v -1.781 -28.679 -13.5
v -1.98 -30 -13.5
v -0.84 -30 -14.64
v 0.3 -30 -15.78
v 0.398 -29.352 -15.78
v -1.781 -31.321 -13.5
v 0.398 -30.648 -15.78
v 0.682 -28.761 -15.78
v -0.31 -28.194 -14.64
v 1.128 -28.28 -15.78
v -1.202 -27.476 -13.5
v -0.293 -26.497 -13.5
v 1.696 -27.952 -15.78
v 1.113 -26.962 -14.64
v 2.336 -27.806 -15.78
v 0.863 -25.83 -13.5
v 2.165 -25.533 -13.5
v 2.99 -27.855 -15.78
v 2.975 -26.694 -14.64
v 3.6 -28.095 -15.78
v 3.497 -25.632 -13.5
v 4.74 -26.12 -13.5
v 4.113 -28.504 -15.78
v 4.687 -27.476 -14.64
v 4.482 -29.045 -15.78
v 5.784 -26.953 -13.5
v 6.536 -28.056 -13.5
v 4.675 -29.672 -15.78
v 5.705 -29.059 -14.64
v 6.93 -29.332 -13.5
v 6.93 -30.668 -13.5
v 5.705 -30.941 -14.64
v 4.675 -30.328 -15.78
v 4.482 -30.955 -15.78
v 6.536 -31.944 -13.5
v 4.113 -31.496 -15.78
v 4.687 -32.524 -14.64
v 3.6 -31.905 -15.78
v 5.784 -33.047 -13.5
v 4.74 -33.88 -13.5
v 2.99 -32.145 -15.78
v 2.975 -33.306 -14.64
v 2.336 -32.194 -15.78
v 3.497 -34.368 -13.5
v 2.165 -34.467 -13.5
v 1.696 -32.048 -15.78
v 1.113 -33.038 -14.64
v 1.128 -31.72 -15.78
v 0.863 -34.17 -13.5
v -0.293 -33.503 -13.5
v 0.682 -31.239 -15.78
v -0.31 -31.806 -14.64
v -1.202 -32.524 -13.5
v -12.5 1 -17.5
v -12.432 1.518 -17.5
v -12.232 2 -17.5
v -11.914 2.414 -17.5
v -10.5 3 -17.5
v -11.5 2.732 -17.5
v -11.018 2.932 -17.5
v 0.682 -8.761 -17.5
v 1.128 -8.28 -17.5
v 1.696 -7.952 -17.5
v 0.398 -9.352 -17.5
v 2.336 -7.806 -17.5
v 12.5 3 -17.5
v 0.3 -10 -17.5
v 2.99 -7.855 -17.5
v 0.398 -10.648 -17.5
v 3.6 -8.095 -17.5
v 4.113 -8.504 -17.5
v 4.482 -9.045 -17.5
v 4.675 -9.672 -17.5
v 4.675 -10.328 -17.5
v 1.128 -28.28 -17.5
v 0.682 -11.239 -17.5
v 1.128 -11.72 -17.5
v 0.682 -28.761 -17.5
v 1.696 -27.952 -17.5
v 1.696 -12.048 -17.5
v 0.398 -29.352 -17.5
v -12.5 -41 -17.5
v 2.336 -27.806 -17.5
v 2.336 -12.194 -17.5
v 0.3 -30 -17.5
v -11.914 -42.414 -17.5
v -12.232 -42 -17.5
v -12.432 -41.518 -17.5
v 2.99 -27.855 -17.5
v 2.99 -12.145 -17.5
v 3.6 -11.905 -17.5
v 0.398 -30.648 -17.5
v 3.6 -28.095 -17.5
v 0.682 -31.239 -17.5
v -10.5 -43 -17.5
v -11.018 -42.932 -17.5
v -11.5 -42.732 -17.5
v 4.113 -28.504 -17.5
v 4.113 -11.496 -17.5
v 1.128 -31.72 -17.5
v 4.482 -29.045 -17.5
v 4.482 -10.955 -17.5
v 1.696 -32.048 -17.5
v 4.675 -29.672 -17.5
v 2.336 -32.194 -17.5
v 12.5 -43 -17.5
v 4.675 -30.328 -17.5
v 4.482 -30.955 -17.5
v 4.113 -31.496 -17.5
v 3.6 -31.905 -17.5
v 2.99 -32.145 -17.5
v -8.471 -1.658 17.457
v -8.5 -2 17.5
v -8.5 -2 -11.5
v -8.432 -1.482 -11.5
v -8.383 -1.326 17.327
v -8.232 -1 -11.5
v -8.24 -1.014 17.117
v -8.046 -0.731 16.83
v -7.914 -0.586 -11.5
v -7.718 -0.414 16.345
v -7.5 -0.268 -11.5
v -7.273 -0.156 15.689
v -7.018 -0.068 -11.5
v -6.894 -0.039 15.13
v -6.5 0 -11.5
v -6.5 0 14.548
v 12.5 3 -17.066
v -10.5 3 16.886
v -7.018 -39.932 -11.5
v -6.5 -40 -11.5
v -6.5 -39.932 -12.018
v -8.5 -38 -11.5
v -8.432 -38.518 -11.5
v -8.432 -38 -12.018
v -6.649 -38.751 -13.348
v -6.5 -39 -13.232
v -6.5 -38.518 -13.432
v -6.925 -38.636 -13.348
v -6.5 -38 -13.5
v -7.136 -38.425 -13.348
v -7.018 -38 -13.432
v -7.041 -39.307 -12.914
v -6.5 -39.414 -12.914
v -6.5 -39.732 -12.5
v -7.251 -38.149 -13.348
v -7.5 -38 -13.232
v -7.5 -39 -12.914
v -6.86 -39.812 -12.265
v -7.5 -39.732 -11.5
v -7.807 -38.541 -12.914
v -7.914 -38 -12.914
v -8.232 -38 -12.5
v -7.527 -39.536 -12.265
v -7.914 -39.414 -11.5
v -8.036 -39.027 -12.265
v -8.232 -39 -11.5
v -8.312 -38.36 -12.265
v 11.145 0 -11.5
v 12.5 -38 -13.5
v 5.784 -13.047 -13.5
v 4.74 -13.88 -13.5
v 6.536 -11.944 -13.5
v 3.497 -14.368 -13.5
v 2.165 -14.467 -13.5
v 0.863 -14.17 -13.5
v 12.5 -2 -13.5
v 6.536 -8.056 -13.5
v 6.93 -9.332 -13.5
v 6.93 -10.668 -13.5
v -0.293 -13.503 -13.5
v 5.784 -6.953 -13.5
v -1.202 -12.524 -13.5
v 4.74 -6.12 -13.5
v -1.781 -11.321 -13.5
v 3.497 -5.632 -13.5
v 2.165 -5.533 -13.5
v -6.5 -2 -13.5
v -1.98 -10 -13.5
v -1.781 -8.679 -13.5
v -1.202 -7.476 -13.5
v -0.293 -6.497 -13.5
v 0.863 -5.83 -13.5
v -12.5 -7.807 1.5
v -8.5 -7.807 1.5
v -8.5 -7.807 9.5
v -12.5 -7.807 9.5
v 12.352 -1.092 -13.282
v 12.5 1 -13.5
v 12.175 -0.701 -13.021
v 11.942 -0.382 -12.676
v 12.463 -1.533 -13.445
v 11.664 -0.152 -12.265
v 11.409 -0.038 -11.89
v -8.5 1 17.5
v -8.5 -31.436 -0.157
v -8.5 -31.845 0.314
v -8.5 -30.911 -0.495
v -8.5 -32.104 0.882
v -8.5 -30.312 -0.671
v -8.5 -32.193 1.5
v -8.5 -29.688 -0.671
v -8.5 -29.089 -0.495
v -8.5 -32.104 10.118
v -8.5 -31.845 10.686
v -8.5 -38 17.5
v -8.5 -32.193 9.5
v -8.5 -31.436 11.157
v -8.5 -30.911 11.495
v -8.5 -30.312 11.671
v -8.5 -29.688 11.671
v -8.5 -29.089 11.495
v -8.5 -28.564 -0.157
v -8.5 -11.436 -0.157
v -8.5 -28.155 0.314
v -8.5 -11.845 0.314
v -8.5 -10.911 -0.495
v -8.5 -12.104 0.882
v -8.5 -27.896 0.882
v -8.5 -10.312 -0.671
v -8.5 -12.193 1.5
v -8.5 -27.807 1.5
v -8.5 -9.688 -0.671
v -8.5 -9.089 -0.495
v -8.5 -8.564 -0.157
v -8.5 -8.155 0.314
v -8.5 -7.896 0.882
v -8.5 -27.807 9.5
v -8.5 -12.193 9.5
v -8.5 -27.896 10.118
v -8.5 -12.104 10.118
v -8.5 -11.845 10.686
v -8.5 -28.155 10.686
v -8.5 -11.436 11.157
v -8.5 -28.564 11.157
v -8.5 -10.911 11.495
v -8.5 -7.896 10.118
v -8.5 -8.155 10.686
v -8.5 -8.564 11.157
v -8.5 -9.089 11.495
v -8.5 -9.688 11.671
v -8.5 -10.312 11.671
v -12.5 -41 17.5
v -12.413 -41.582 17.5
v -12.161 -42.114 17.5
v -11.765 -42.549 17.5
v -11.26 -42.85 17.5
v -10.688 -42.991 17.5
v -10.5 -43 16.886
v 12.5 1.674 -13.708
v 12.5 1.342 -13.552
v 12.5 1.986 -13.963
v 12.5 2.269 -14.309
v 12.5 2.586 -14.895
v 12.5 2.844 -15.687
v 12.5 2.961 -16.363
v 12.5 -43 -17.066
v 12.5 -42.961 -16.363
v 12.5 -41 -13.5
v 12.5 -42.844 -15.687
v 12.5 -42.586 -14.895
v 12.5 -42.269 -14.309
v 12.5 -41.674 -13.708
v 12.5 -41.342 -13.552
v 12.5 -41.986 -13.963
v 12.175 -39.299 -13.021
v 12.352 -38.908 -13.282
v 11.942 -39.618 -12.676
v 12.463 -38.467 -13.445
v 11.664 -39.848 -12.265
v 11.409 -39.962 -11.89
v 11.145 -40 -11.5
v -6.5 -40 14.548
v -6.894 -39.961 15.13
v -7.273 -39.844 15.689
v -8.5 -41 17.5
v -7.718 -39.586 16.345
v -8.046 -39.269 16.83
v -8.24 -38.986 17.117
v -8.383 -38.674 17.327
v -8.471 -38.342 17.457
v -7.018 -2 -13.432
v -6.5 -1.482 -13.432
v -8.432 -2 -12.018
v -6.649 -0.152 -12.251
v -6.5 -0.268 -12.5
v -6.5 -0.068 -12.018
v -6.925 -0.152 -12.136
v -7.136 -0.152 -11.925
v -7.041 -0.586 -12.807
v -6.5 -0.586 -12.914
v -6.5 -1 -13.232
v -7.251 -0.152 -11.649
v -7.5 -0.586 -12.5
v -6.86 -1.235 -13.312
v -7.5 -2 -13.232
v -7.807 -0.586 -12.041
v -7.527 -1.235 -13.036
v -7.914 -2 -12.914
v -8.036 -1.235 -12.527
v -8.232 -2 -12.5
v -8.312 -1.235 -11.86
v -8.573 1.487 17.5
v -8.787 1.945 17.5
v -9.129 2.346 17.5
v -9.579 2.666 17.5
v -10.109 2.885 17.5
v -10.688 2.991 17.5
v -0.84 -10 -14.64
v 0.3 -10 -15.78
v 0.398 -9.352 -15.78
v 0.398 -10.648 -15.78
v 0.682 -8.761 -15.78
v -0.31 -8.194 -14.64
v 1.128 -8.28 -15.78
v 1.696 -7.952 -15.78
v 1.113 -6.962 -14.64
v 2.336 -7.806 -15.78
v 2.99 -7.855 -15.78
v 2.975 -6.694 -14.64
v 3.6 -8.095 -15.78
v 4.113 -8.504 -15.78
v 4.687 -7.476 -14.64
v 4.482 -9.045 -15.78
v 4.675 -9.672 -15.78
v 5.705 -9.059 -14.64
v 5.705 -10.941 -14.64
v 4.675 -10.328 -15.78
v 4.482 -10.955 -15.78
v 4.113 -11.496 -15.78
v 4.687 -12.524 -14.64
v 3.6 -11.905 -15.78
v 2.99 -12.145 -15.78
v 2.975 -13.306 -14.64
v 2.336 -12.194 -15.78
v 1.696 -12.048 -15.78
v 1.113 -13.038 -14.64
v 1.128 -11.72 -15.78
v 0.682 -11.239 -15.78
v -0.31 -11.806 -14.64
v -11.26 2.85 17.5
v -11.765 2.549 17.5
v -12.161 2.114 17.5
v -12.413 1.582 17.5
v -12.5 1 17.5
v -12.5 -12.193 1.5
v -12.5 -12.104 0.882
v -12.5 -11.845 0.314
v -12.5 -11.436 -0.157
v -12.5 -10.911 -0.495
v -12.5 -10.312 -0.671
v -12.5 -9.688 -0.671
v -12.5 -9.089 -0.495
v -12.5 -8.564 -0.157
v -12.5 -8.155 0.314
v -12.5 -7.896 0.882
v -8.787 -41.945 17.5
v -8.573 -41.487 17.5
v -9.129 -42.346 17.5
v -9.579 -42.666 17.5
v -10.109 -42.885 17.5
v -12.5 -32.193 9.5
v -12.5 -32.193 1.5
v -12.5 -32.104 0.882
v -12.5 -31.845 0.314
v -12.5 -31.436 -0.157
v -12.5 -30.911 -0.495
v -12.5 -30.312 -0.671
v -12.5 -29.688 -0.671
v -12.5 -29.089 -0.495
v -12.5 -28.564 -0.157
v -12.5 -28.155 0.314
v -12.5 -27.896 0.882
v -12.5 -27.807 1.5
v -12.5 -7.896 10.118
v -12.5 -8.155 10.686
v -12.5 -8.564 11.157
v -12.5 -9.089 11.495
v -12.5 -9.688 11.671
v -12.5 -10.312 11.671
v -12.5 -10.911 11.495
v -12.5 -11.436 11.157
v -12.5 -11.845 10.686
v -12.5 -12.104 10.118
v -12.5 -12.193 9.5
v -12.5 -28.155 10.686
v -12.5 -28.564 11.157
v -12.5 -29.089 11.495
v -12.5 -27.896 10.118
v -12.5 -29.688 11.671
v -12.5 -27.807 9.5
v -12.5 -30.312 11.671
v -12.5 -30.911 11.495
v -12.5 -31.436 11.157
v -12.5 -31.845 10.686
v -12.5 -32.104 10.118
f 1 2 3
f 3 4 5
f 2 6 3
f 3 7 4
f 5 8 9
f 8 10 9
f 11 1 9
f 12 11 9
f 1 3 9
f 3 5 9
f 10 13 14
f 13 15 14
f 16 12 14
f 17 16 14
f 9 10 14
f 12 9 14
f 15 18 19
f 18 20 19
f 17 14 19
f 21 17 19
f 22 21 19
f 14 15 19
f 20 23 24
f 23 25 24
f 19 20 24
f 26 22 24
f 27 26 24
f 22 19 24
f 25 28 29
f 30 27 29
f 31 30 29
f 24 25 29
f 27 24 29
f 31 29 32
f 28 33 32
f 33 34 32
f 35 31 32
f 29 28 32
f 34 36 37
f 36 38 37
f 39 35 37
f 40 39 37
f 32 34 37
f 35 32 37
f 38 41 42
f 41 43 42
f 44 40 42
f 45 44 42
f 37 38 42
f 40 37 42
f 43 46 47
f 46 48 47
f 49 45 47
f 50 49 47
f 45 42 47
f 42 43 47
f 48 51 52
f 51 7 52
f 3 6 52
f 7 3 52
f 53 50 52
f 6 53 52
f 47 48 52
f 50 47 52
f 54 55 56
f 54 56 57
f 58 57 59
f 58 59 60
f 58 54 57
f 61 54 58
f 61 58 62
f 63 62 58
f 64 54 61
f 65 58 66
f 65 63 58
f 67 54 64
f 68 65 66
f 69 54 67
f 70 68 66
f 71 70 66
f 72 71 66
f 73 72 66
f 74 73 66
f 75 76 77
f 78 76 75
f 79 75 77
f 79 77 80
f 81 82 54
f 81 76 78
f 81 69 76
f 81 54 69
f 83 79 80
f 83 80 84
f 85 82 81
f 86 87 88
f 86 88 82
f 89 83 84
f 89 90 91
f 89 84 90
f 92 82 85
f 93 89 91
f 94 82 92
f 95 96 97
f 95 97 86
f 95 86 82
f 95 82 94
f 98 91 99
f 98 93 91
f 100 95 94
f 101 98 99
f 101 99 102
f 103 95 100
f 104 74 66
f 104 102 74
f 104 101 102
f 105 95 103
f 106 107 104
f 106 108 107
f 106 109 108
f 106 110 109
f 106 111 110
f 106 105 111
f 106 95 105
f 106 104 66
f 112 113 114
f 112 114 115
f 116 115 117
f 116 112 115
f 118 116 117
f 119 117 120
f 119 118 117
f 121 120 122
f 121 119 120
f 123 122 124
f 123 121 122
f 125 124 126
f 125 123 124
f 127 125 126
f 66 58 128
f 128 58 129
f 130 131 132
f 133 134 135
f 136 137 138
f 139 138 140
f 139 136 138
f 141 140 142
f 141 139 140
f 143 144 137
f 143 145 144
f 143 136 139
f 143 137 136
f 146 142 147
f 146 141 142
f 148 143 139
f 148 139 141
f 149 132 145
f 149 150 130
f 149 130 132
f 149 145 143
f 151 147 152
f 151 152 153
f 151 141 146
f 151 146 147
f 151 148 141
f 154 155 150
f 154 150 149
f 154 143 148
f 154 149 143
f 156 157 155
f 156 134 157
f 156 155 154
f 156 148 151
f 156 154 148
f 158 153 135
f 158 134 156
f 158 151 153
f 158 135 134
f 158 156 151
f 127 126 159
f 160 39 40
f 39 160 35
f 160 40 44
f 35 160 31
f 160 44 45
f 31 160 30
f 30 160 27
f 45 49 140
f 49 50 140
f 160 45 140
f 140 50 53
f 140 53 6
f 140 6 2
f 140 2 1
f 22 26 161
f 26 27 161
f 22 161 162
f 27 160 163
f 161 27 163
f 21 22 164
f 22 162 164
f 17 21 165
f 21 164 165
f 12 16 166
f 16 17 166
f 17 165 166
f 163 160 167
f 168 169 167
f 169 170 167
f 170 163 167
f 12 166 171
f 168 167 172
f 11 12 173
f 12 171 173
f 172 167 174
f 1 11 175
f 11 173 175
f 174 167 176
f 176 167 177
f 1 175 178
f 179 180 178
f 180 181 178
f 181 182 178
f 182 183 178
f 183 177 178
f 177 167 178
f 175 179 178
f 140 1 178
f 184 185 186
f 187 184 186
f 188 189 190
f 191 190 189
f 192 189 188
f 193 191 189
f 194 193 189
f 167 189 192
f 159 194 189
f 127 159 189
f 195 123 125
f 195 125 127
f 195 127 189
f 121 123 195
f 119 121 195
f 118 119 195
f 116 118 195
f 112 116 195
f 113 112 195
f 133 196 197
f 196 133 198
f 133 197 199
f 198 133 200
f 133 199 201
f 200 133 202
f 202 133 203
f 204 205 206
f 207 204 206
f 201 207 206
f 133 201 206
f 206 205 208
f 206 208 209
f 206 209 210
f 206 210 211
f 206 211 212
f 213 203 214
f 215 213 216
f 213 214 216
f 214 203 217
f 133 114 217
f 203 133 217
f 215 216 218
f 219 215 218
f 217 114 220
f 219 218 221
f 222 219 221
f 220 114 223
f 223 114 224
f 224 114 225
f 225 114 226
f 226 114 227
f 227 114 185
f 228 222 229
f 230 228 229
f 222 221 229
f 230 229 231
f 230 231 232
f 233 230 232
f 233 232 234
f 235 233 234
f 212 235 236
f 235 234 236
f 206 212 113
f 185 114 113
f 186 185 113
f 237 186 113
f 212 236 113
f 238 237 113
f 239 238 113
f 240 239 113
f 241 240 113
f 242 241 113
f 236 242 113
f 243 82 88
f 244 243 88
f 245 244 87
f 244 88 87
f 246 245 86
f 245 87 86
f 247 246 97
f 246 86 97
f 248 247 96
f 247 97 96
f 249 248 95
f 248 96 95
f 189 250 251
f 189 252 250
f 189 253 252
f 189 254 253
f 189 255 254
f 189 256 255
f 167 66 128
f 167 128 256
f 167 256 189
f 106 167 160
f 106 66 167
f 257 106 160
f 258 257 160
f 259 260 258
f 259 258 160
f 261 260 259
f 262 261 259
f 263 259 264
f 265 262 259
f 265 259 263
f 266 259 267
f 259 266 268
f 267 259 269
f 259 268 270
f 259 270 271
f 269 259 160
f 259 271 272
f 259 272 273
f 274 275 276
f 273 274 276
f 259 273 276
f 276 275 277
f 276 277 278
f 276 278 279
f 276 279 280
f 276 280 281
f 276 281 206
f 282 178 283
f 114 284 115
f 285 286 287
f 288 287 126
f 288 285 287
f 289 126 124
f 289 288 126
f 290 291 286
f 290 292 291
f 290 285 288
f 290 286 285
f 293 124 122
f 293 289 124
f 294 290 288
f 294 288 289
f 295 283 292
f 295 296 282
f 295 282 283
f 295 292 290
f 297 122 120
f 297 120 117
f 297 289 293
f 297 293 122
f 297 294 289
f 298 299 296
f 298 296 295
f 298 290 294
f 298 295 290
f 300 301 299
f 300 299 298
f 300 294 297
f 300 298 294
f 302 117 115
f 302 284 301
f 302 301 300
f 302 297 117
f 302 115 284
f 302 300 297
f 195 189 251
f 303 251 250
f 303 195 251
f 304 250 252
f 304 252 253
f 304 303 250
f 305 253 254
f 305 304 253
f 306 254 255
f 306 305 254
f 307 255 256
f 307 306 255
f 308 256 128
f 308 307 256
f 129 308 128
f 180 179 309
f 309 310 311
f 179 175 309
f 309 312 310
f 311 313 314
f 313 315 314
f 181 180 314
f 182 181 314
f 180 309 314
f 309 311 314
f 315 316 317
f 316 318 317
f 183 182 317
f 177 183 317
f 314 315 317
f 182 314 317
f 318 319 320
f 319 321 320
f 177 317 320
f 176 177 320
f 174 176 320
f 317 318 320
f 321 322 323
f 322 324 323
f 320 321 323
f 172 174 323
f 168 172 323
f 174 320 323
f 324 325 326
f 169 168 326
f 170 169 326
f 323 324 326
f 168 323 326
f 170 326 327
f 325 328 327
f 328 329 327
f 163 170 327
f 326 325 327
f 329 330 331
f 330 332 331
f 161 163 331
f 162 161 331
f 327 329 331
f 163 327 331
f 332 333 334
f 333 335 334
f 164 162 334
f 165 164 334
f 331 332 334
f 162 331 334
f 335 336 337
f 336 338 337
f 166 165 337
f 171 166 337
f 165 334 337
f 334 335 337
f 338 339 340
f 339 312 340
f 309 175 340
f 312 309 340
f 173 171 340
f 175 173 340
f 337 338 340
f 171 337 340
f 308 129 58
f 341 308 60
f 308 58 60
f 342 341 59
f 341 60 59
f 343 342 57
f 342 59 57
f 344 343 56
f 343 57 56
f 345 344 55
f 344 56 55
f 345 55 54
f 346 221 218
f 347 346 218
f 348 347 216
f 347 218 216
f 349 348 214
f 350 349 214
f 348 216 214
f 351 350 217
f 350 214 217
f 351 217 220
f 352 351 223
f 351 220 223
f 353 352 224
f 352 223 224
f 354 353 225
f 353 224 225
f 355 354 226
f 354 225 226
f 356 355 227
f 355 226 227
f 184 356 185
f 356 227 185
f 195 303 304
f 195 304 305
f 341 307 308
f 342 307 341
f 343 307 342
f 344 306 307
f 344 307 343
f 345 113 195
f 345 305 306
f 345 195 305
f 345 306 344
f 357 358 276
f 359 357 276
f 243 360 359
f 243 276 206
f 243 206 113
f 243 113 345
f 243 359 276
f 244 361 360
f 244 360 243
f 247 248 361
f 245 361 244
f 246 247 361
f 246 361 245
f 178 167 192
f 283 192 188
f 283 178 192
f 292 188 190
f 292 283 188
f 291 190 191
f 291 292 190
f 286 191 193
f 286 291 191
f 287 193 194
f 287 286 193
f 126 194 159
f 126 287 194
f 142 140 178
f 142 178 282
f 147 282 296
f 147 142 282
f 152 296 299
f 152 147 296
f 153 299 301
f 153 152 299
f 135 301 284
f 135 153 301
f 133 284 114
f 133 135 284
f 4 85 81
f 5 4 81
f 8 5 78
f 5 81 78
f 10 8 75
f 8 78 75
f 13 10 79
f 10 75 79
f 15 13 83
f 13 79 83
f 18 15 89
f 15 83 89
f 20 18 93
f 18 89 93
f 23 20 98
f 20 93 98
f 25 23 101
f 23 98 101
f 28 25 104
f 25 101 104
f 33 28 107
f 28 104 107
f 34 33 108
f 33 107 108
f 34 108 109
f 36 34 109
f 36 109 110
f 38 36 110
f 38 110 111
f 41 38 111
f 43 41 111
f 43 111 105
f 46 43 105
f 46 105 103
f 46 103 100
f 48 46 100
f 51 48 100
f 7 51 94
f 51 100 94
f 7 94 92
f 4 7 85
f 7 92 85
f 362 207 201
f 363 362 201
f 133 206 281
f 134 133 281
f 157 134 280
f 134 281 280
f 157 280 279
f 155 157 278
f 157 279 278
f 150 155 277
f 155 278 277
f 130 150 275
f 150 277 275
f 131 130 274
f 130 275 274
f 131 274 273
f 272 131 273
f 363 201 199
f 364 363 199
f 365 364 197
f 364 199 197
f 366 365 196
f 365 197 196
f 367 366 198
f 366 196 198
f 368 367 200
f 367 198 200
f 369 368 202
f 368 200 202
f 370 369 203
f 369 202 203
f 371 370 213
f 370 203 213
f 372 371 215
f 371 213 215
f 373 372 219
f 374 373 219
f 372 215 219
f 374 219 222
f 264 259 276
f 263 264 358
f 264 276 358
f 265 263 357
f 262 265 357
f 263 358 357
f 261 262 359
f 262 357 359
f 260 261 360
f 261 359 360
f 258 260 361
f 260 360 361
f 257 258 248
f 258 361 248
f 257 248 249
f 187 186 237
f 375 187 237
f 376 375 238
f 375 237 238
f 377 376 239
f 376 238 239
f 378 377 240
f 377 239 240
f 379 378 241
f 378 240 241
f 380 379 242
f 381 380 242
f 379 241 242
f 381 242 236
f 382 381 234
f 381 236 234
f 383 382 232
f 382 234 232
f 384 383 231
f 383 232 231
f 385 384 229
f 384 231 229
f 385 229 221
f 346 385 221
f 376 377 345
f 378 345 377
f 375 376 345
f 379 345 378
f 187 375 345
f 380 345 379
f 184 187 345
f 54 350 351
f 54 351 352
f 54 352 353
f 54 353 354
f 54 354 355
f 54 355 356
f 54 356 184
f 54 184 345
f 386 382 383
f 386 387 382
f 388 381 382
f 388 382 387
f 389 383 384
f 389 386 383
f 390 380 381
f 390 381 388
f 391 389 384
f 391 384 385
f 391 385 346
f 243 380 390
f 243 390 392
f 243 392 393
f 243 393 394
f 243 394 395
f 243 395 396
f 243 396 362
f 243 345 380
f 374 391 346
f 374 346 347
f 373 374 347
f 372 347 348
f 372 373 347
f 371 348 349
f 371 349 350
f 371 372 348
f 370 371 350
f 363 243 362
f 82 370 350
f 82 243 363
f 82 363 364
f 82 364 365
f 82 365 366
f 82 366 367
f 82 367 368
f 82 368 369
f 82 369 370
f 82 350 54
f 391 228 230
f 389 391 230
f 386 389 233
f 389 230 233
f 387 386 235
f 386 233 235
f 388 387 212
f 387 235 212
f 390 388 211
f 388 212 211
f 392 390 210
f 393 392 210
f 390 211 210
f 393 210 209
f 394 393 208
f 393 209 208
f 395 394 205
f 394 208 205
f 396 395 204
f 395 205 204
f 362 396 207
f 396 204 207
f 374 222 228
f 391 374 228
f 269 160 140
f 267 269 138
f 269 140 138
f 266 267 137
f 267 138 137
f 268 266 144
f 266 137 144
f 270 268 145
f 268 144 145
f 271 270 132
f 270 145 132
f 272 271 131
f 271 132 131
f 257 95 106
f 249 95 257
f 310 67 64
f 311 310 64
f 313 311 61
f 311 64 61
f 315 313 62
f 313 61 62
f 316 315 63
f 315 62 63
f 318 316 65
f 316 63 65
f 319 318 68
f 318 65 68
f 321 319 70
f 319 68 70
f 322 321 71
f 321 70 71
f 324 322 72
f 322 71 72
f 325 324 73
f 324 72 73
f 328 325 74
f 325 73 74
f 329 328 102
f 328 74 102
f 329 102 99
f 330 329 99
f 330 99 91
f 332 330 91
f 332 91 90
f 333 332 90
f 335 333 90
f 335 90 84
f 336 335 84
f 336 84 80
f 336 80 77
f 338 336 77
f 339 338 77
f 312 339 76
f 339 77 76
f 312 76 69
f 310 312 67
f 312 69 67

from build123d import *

# Parameters (mm, degrees)
F1_DEPTH       = 40
F3_DEPTH       = 4
F5_D           = 4.4
F5_CSINK_D     = 8.96
F5_CSINK_ANGLE = 90
F7_DEPTH       = 3
F10_R          = 2
F11_T1_DEPTH   = 45


# Not quite as in the source:
# - a fillet or chamfer that OpenCascade refuses, or shapes differently, is made with other operations: its cross-section is extruded or revolved along the edge and cut away or added


with BuildPart() as f1:
    # F0 (on Front) → F1 (new body)
    with BuildSketch(Plane.XZ):
        Polygon((-12.4999986735, 17.5), (-12.4999986735, -17.5), (12.4999986735, -17.5), (12.4999986735, -13.5), (-8.4999986735, -13.5), (-8.4999986735, 17.5), align=None)
    extrude(amount=F1_DEPTH)

    # F2 (on face) → F3 (cut, through all)
    with BuildSketch(Plane.YZ.offset(-8.4999986735)):
        with BuildLine():
            ThreePointArc((-27.8069023984, 9.5), (-30, 11.6930976016), (-32.1930976016, 9.5))
            Line((-32.1930976016, 9.5), (-32.1930976016, 1.5))
            ThreePointArc((-32.1930976016, 1.5), (-30, -0.6930976016), (-27.8069023984, 1.5))
            Line((-27.8069023984, 1.5), (-27.8069023984, 9.5))
        make_face()
        with BuildLine():
            Line((-7.8069023984, 1.5), (-7.8069023984, 9.5))
            ThreePointArc((-7.8069023984, 9.5), (-10, 11.6930976016), (-12.1930976016, 9.5))
            Line((-12.1930976016, 9.5), (-12.1930976016, 1.5))
            ThreePointArc((-12.1930976016, 1.5), (-10, -0.6930976016), (-7.8069023984, 1.5))
        make_face()
    extrude(amount=-F3_DEPTH, mode=Mode.SUBTRACT)

    # F5 (through all)
    with Locations(Plane.XY.offset(-13.5)):
        with Locations((2.4999986735, -30), (2.4999986735, -10)):
            CounterSinkHole(F5_D / 2, F5_CSINK_D / 2, counter_sink_angle=F5_CSINK_ANGLE)

    # F6 (on face) → F7 (join)
    with BuildSketch(Plane.XZ.offset(40)):
        Polygon((12.4999986735, -13.5), (-8.4999986735, 17.5), (-12.4999986735, 17.5), (-12.4999986735, -17.5), (12.4999986735, -17.5), align=None)
    extrude(amount=F7_DEPTH)

    # F9: F1 across plane


with BuildPart() as f1_1:
    add(f1.part)
    add(f1.part.mirror(Plane(origin=(-5.812499541, -20, -5.812499541), x_dir=(1, 0, 0), z_dir=(0, 1, 0))))

    # F10
    f10_edges = [f1_1.edges().sort_by_distance(p)[0] for p in [
        (-8.499999, -40, 2),
        (2, -40, -13.5),
        (-8.499999, -20, -13.5),
        (2, 0, -13.5),
        (-8.499999, 0, 2),
        (2, 3, 2),
        (2, -43, 2),
    ]]
    fillet(f10_edges, radius=F10_R)

    # F11: fillet of radius 2 on 2 edges, made by hand

    # F11_s2 → F11_t1 (cut)
    with BuildSketch(Plane.XY.offset(-22.5)):
        with BuildLine():
            ThreePointArc((-10.4999986735, 3), (-11.9142122359, 2.4142135624), (-12.4999986735, 1))
            Line((-12.4999986735, 1), (-12.4999986735, 3))
            Line((-12.4999986735, 3), (-10.4999986735, 3))
        make_face()
        with BuildLine():
            ThreePointArc((-12.4999986735, -41), (-11.9142122359, -42.4142135624), (-10.4999986735, -43))
            Line((-10.4999986735, -43), (-12.4999986735, -43))
            Line((-12.4999986735, -43), (-12.4999986735, -41))
        make_face()
    extrude(amount=F11_T1_DEPTH, mode=Mode.SUBTRACT)


solid = f1_1.part
